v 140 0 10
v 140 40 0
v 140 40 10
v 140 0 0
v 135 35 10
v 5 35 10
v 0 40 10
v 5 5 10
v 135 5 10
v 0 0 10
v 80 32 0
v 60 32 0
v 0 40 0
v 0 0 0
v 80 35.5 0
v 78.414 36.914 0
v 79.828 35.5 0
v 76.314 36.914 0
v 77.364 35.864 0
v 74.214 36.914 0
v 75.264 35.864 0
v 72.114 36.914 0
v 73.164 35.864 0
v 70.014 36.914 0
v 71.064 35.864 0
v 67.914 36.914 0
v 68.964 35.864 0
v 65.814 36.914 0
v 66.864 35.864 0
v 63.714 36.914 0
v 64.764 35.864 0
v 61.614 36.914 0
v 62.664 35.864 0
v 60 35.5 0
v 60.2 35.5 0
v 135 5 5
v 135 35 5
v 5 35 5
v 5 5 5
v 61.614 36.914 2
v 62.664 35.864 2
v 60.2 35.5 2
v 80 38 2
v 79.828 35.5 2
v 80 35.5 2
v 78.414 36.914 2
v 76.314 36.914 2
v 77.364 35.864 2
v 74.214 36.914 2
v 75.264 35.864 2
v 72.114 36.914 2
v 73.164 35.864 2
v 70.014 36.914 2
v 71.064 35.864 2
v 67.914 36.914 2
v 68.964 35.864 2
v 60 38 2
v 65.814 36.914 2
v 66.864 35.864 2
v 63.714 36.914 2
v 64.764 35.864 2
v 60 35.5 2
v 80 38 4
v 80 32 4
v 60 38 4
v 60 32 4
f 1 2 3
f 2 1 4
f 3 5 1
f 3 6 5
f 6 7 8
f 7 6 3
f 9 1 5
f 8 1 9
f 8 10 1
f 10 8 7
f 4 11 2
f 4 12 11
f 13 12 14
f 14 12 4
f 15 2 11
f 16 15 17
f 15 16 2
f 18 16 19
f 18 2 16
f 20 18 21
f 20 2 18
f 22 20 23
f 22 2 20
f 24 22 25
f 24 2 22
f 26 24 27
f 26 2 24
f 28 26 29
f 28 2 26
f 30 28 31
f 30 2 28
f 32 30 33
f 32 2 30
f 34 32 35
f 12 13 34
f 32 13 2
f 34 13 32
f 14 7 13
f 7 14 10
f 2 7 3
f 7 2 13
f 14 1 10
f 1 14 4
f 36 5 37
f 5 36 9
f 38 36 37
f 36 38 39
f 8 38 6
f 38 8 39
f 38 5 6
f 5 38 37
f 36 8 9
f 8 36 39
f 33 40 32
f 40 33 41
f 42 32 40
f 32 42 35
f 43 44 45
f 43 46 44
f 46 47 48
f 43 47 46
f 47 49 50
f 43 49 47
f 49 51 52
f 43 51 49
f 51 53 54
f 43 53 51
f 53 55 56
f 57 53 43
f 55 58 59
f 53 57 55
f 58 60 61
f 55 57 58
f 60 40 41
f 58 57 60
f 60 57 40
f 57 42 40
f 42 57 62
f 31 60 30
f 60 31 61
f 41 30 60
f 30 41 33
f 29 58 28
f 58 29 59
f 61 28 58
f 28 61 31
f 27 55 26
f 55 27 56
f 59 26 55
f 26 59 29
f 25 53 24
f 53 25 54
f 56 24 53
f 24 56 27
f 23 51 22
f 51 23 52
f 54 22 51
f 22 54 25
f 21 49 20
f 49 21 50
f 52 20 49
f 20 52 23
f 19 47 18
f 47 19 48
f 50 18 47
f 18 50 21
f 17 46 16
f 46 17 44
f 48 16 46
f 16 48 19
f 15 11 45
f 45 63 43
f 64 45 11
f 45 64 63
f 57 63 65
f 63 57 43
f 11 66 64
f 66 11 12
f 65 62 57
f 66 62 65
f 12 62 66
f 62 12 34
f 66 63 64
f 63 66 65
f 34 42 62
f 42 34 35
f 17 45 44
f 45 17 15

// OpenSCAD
// Module instantiation
//LetterBlock("M");

frame_x = 140;
frame_y = 40;
frame_z = 10;
echo(frame_x=frame_x);
echo(frame_y=frame_y);
echo(frame_z=frame_z);

hollowsert = 5;
hollowsert_x = frame_x - (hollowsert * 2);
hollowsert_y = frame_y - (hollowsert * 2);
hollowsert_z = hollowsert;

echo(hollowsert_x=hollowsert_x);
echo(hollowsert_y=hollowsert_y);
echo(hollowsert_z=hollowsert_z);

module Frame() {
    difference() {
        cube([frame_x, frame_y, frame_z]);
        translate([hollowsert,hollowsert,frame_z-hollowsert_z])
            cube([hollowsert_x, hollowsert_y, hollowsert_z]);
        // punch a hole through the center
        //translate([55,10,0])
        //    cube([10, 10, 100]);
        // see what's underneath
        //translate([-200,-200,0])
        //    cube([400, 400, 5]);
    }
}

inset_x = 20;
inset_y = 2;
inset1_z = 6;
inset2_z = 3.5;

module Inset() {
//    translate([hollowsert,hollowsert,frame_z-hollowsert_z])
    cube([inset_x, inset_y, inset1_z]);
    translate([0,inset_y,0])
        cube([inset_x, inset_y, inset2_z]);
    for (a = [ 0.2 : 2.1 : 18 ])
        translate([a, inset_y, inset2_z])
            rotate([0,45,0])
                cube(2);
}

module Ridges() {
    translate([0,-20,0])
        cylinder(h=3,r=8);
}

difference() {
    Frame();
    translate([(frame_x/2)-(inset_x/2),(frame_y-8),inset_y*2])
        rotate([270,0,0])
                Inset();
}
    
echo(version=version());

// Functions can be defined to simplify code using lots of
// calculations.

module SimpleFunction() {
// Simple example with a single function argument (which should
// be a number) and returning a number calculated based on that.
function f(x) = 0.5 * x + 1;

color("red")
    for (a = [ -25 : 5 : 25 ])
        translate([a, f(a), 0]) cube(2, center = true);
}

module ComplexFunction() {
// Functions can call other functions and return complex values
// too. In this case a 3 element vector is returned which can
// be used as point in 3D space or as vector (in the mathematical
// meaning) for translations and other transformations.
//function g(x) = [ 5 * x + 20, f(x) * f(x) - 50, 0 ];

//color("green")
    //for (a = [ -200 : 10 : 200 ])
        //translate(g(a / 8)) sphere(1);
}

// Module definition.
// size=30 defines an optional parameter with a default value.
module LetterBlock(letter, size=30) {
    difference() {
        translate([0,0,size/4]) cube([size,size,size/2], center=true);
        translate([0,0,size/6]) {
            // convexity is needed for correct preview
            // since characters can be highly concave
            linear_extrude(height=size, convexity=4)
                text(letter, 
                     size=size*22/30,
                     font="Bitstream Vera Sans",
                     halign="center",
                     valign="center");
        }
    }
}
